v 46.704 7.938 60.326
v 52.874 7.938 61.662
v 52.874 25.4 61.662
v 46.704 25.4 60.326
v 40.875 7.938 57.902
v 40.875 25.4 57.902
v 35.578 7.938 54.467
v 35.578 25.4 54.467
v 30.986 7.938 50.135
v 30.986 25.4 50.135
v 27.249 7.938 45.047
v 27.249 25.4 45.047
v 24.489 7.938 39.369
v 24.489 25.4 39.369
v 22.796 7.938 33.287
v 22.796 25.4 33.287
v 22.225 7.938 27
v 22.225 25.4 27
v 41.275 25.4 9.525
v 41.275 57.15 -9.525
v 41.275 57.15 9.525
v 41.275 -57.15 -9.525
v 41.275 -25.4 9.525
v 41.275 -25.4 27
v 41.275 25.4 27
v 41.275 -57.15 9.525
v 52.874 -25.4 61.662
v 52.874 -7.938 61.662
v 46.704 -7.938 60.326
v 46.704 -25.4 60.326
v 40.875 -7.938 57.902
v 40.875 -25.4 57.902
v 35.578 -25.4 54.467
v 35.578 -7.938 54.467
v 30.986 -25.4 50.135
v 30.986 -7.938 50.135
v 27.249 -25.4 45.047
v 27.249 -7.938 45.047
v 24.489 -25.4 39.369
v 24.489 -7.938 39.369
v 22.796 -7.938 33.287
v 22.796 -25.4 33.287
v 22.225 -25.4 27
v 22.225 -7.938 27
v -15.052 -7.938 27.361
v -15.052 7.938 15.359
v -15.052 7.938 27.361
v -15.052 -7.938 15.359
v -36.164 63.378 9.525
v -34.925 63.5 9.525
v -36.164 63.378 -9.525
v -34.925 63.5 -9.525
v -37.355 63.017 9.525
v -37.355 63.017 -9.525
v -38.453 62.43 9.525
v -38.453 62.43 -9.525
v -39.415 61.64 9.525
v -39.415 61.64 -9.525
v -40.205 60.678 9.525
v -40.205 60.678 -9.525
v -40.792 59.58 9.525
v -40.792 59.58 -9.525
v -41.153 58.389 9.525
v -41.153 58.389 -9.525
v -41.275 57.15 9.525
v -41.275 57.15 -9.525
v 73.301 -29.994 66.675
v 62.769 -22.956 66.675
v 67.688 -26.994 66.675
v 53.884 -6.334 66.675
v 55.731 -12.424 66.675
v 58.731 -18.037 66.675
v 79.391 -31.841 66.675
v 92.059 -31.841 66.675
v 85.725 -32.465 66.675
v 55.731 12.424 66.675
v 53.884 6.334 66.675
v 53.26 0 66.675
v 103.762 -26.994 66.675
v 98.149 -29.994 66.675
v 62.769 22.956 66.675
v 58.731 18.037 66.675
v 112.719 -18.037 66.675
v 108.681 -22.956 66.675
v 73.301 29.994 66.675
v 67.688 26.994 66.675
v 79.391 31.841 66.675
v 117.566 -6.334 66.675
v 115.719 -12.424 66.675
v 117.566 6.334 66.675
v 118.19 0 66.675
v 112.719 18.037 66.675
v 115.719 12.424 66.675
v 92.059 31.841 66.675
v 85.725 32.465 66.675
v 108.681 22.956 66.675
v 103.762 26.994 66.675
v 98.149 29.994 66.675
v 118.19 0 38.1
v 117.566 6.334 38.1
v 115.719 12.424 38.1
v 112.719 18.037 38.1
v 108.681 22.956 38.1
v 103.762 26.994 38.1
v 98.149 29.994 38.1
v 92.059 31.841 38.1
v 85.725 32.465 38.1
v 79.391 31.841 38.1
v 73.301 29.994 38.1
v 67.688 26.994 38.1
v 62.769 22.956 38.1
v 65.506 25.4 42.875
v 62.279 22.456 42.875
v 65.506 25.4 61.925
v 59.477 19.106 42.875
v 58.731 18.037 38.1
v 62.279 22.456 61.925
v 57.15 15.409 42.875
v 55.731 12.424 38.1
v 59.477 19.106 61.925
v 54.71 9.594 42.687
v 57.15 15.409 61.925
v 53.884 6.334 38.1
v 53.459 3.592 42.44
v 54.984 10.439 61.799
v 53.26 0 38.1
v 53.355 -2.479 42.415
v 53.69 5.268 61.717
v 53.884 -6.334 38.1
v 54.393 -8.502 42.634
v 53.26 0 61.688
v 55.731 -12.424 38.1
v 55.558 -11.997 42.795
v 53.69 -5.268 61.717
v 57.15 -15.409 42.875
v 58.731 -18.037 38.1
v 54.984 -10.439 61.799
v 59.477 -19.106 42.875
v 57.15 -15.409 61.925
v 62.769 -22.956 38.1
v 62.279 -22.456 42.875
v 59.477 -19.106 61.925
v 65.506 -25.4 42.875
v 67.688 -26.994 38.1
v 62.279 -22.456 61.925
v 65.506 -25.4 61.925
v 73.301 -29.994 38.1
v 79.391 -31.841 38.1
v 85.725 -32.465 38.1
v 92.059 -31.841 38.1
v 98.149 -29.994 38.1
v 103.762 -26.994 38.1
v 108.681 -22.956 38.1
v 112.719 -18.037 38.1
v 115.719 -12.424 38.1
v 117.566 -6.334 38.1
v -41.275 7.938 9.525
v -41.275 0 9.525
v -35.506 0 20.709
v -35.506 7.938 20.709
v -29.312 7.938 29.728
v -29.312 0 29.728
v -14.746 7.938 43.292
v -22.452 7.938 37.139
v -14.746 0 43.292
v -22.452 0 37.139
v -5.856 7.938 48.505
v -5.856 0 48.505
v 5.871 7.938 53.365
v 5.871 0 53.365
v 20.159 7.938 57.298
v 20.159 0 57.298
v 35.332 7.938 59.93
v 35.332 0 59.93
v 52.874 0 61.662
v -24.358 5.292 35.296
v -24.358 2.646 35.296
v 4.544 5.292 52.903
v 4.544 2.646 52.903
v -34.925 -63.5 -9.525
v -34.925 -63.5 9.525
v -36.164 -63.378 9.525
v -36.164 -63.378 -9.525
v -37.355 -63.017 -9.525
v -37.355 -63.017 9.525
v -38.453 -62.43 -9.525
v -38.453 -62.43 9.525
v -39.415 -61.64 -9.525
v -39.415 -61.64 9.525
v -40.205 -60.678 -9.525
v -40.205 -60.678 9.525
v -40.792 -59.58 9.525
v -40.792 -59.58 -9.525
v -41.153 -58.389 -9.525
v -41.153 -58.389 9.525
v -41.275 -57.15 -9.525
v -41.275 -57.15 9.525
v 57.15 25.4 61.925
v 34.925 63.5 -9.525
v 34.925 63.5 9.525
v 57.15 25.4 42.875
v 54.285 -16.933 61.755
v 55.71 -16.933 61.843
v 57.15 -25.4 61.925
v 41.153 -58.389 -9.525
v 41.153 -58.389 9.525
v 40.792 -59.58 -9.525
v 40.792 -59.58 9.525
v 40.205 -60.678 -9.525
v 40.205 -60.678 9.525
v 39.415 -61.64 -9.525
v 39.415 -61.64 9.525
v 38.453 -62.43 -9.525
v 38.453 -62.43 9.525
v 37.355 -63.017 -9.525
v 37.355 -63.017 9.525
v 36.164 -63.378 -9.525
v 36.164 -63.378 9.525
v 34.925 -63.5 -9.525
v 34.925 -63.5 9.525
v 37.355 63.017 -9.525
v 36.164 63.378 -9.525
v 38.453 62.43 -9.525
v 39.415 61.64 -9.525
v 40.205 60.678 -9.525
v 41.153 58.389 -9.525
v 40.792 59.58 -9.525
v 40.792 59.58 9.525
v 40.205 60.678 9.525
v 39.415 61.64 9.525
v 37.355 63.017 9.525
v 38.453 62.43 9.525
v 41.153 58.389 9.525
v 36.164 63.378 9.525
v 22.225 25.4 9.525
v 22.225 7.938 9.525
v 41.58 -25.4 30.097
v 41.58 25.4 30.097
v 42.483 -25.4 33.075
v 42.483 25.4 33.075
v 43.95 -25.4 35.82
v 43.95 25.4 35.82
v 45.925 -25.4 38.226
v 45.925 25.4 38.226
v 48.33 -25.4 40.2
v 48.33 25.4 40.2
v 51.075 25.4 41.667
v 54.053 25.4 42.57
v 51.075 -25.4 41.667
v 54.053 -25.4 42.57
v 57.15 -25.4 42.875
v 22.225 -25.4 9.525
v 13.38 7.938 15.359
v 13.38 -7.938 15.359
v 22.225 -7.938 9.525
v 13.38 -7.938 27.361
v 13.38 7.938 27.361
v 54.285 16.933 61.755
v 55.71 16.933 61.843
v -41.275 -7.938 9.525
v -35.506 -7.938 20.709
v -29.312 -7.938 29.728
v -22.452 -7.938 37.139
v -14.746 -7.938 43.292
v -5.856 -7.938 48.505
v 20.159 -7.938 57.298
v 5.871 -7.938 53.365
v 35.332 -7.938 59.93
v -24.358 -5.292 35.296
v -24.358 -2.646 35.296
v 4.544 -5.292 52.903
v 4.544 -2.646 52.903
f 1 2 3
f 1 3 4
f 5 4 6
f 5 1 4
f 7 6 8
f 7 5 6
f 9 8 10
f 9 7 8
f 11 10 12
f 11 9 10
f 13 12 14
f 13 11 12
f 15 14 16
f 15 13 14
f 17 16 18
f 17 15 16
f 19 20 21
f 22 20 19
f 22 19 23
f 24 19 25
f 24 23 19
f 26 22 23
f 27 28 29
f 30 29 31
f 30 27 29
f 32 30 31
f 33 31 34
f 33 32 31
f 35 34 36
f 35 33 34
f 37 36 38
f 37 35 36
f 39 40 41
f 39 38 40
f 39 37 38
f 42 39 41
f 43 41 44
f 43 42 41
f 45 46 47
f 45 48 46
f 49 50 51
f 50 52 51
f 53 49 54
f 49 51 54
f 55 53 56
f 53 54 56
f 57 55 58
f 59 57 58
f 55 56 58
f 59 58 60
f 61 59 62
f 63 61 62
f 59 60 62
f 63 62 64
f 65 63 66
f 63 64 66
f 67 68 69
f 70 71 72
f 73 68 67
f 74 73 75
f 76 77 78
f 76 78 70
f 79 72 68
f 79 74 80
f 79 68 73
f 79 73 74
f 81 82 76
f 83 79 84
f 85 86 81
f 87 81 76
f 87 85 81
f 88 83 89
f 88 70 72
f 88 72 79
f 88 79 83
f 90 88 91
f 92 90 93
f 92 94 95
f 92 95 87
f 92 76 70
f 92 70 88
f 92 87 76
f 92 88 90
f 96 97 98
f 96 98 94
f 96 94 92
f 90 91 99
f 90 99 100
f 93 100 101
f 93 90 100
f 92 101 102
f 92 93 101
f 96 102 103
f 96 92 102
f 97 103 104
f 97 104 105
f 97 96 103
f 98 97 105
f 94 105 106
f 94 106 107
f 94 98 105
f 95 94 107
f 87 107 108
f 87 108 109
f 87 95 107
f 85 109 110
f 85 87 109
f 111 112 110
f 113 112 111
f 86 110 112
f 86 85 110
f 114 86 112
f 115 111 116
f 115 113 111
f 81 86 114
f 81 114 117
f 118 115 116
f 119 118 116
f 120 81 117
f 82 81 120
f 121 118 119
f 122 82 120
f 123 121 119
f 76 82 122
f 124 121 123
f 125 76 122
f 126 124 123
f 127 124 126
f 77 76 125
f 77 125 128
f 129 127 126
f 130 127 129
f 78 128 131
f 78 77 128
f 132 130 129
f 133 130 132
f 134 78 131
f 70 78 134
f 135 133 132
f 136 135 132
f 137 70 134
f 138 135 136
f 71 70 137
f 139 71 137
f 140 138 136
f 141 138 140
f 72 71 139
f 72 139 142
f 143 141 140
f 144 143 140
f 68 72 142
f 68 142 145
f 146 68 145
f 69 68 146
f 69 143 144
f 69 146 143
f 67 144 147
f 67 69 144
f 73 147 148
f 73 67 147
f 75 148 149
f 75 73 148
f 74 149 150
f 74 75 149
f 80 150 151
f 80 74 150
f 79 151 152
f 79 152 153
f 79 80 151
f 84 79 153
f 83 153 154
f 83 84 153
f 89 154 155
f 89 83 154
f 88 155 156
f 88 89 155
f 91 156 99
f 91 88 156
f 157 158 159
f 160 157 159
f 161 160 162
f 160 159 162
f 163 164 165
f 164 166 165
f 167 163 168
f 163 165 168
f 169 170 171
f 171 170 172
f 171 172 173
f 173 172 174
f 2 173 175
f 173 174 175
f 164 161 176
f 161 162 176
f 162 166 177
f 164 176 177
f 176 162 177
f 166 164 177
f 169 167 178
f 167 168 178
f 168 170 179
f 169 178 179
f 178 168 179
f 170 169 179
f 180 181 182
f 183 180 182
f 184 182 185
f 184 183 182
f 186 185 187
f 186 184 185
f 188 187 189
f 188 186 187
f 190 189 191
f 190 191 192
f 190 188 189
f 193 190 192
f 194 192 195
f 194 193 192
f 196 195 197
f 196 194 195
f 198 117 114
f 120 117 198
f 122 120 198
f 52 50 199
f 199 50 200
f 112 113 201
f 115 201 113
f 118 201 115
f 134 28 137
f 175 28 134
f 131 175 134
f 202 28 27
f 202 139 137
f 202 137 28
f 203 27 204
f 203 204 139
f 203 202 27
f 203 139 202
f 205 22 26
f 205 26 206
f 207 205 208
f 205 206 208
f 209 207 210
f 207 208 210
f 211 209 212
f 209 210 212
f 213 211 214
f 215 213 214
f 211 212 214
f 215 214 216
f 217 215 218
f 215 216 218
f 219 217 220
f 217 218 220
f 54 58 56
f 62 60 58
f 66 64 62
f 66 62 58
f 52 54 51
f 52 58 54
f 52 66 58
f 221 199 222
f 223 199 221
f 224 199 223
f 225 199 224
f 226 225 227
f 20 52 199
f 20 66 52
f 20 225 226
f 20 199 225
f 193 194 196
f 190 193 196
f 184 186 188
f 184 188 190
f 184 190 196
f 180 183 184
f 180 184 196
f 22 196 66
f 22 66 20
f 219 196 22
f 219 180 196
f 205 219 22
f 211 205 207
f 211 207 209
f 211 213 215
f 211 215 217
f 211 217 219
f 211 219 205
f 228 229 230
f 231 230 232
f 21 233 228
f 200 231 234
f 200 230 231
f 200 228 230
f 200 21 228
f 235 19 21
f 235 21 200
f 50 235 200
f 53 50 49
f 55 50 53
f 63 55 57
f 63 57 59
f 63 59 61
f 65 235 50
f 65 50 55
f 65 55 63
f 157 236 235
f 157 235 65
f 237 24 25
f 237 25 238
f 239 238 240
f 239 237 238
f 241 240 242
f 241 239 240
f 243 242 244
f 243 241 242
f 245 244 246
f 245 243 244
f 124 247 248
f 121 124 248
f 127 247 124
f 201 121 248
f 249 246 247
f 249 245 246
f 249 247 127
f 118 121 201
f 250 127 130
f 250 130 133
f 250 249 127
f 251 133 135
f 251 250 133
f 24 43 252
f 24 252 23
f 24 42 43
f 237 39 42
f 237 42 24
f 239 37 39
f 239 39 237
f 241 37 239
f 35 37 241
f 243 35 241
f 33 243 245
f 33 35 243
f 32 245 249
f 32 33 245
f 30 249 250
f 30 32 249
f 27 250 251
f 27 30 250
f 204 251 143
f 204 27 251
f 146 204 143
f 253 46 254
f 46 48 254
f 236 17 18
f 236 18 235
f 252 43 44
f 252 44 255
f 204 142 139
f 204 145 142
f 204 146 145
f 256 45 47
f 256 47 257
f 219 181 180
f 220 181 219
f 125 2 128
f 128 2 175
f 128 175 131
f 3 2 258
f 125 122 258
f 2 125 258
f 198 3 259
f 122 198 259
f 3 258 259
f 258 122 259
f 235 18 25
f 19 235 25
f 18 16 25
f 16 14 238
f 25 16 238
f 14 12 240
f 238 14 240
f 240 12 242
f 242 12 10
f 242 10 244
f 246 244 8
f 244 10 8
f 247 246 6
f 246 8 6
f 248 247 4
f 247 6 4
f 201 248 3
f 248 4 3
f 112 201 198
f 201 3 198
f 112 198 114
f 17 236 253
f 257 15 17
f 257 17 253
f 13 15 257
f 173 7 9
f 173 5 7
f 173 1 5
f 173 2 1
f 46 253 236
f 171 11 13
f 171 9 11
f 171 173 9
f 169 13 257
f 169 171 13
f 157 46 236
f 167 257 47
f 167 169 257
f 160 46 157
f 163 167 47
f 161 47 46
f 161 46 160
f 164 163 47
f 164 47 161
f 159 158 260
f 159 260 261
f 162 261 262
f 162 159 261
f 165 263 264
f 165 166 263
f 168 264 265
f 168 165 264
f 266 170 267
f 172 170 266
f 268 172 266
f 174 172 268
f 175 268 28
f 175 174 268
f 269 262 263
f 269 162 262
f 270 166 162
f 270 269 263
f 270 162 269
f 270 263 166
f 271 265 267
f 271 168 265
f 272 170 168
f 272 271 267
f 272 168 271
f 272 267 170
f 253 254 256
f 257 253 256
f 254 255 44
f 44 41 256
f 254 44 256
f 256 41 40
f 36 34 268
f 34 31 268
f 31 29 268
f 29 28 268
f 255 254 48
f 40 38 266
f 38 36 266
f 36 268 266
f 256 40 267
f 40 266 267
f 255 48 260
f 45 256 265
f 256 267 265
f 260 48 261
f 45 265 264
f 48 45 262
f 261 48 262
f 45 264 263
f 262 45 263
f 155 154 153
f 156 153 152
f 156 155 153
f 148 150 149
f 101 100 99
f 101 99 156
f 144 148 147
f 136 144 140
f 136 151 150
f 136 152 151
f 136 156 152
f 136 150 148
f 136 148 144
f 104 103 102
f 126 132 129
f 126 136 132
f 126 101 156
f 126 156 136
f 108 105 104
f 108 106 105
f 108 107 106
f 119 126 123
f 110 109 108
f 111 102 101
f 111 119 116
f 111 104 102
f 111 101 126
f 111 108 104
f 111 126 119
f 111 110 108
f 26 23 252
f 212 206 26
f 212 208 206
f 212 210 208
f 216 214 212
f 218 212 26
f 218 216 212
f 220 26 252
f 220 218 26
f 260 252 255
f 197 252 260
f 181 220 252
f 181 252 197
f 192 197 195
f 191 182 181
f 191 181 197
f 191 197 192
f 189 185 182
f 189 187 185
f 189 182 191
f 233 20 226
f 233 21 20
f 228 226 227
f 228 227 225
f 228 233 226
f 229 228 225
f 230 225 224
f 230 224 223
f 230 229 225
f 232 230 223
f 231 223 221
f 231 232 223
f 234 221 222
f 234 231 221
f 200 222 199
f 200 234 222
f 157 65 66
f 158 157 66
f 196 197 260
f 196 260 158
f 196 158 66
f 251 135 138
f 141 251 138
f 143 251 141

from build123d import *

# Parameters (mm, degrees)
F1_DEPTH = 63.5
F0_W     = 28.432126
F0_H     = 12.001499
F2_DEPTH = 7.9375
F0_W_2   = 18.334983
F0_H_2   = 4.7498
F3_DEPTH = 25.4
F5_R     = 6.35


with BuildPart() as f1:
    # F0 (on Front) → F1 (new body, symmetric)
    with BuildSketch(Plane.XZ):
        Polygon((-41.275, 9.525), (-41.275, -9.525), (41.275, -9.525), (41.275, 9.525), (22.225, 9.525), align=None)
    extrude(amount=F1_DEPTH, both=True)

    # F0 (on Front) → F2 (join, symmetric)
    with BuildSketch(Plane.XZ):
        with BuildLine():
            add(Edge.make_bspline(
                [(-41.275, 9.525), (-27.868627, 39.151042), (-7.652168, 57.55358), (52.874146, 61.662466)],
                knots=[0, 0, 0, 0, 108.977586, 108.977586, 108.977586, 108.977586], degree=3))
            Line((-41.275, 9.525), (22.225, 9.525))
            Line((22.225, 9.525), (22.225, 27.0002))
            ThreePointArc((22.225, 27.0002), (30.986191, 50.134821), (52.874146, 61.662466))
        make_face()
        with Locations((-0.836268, 21.359812)):
            Rectangle(F0_W, F0_H, mode=Mode.SUBTRACT)
    extrude(amount=F2_DEPTH, both=True)

    # F0 (on Front) → F3 (join, symmetric)
    with BuildSketch(Plane.XZ):
        with BuildLine():
            Line((22.225, 9.525), (41.275, 9.525))
            Line((41.275, 9.525), (41.275, 27.0002))
            ThreePointArc((41.275, 27.0002), (45.92468, 38.22552), (57.15, 42.8752))
            Line((57.15, 42.8752), (67.390017, 42.8752))
            Line((67.390017, 42.8752), (67.390017, 61.9252))
            Line((67.390017, 61.9252), (57.15, 61.9252))
            add(Edge.make_bspline(
                [(52.874146, 61.662466), (54.277618, 61.757742), (55.702763, 61.845333), (57.15, 61.9252)],
                knots=[108.977586, 108.977586, 108.977586, 108.977586, 111.504536, 111.504536, 111.504536, 111.504536], degree=3))
            ThreePointArc((52.874146, 61.662466), (30.986191, 50.134821), (22.225, 27.0002))
            Line((22.225, 27.0002), (22.225, 9.525))
        make_face()
        with Locations((76.557508, 64.3001)):
            Rectangle(F0_W_2, F0_H_2)
    extrude(amount=F3_DEPTH, both=True)

    # F0 (on Front) → F4 (revolve)
    with BuildSketch(Plane.XZ):
        Polygon((85.725, 66.675), (85.725, 61.9252), (85.725, 42.8752), (85.725, 38.1), (118.190017, 38.1), (118.190017, 66.675), align=None)
    revolve(axis=Axis((85.725, 0, 52.4002), (0, 0, 1)))

    # F5
    f5_edges = [f1.edges().sort_by_distance(p)[0] for p in [
        (-41.275, -63.5, 0),
        (41.275, -63.5, 0),
        (41.275, 63.5, 0),
        (-41.275, 63.5, 0),
    ]]
    fillet(f5_edges, radius=F5_R)


solid = f1.part
